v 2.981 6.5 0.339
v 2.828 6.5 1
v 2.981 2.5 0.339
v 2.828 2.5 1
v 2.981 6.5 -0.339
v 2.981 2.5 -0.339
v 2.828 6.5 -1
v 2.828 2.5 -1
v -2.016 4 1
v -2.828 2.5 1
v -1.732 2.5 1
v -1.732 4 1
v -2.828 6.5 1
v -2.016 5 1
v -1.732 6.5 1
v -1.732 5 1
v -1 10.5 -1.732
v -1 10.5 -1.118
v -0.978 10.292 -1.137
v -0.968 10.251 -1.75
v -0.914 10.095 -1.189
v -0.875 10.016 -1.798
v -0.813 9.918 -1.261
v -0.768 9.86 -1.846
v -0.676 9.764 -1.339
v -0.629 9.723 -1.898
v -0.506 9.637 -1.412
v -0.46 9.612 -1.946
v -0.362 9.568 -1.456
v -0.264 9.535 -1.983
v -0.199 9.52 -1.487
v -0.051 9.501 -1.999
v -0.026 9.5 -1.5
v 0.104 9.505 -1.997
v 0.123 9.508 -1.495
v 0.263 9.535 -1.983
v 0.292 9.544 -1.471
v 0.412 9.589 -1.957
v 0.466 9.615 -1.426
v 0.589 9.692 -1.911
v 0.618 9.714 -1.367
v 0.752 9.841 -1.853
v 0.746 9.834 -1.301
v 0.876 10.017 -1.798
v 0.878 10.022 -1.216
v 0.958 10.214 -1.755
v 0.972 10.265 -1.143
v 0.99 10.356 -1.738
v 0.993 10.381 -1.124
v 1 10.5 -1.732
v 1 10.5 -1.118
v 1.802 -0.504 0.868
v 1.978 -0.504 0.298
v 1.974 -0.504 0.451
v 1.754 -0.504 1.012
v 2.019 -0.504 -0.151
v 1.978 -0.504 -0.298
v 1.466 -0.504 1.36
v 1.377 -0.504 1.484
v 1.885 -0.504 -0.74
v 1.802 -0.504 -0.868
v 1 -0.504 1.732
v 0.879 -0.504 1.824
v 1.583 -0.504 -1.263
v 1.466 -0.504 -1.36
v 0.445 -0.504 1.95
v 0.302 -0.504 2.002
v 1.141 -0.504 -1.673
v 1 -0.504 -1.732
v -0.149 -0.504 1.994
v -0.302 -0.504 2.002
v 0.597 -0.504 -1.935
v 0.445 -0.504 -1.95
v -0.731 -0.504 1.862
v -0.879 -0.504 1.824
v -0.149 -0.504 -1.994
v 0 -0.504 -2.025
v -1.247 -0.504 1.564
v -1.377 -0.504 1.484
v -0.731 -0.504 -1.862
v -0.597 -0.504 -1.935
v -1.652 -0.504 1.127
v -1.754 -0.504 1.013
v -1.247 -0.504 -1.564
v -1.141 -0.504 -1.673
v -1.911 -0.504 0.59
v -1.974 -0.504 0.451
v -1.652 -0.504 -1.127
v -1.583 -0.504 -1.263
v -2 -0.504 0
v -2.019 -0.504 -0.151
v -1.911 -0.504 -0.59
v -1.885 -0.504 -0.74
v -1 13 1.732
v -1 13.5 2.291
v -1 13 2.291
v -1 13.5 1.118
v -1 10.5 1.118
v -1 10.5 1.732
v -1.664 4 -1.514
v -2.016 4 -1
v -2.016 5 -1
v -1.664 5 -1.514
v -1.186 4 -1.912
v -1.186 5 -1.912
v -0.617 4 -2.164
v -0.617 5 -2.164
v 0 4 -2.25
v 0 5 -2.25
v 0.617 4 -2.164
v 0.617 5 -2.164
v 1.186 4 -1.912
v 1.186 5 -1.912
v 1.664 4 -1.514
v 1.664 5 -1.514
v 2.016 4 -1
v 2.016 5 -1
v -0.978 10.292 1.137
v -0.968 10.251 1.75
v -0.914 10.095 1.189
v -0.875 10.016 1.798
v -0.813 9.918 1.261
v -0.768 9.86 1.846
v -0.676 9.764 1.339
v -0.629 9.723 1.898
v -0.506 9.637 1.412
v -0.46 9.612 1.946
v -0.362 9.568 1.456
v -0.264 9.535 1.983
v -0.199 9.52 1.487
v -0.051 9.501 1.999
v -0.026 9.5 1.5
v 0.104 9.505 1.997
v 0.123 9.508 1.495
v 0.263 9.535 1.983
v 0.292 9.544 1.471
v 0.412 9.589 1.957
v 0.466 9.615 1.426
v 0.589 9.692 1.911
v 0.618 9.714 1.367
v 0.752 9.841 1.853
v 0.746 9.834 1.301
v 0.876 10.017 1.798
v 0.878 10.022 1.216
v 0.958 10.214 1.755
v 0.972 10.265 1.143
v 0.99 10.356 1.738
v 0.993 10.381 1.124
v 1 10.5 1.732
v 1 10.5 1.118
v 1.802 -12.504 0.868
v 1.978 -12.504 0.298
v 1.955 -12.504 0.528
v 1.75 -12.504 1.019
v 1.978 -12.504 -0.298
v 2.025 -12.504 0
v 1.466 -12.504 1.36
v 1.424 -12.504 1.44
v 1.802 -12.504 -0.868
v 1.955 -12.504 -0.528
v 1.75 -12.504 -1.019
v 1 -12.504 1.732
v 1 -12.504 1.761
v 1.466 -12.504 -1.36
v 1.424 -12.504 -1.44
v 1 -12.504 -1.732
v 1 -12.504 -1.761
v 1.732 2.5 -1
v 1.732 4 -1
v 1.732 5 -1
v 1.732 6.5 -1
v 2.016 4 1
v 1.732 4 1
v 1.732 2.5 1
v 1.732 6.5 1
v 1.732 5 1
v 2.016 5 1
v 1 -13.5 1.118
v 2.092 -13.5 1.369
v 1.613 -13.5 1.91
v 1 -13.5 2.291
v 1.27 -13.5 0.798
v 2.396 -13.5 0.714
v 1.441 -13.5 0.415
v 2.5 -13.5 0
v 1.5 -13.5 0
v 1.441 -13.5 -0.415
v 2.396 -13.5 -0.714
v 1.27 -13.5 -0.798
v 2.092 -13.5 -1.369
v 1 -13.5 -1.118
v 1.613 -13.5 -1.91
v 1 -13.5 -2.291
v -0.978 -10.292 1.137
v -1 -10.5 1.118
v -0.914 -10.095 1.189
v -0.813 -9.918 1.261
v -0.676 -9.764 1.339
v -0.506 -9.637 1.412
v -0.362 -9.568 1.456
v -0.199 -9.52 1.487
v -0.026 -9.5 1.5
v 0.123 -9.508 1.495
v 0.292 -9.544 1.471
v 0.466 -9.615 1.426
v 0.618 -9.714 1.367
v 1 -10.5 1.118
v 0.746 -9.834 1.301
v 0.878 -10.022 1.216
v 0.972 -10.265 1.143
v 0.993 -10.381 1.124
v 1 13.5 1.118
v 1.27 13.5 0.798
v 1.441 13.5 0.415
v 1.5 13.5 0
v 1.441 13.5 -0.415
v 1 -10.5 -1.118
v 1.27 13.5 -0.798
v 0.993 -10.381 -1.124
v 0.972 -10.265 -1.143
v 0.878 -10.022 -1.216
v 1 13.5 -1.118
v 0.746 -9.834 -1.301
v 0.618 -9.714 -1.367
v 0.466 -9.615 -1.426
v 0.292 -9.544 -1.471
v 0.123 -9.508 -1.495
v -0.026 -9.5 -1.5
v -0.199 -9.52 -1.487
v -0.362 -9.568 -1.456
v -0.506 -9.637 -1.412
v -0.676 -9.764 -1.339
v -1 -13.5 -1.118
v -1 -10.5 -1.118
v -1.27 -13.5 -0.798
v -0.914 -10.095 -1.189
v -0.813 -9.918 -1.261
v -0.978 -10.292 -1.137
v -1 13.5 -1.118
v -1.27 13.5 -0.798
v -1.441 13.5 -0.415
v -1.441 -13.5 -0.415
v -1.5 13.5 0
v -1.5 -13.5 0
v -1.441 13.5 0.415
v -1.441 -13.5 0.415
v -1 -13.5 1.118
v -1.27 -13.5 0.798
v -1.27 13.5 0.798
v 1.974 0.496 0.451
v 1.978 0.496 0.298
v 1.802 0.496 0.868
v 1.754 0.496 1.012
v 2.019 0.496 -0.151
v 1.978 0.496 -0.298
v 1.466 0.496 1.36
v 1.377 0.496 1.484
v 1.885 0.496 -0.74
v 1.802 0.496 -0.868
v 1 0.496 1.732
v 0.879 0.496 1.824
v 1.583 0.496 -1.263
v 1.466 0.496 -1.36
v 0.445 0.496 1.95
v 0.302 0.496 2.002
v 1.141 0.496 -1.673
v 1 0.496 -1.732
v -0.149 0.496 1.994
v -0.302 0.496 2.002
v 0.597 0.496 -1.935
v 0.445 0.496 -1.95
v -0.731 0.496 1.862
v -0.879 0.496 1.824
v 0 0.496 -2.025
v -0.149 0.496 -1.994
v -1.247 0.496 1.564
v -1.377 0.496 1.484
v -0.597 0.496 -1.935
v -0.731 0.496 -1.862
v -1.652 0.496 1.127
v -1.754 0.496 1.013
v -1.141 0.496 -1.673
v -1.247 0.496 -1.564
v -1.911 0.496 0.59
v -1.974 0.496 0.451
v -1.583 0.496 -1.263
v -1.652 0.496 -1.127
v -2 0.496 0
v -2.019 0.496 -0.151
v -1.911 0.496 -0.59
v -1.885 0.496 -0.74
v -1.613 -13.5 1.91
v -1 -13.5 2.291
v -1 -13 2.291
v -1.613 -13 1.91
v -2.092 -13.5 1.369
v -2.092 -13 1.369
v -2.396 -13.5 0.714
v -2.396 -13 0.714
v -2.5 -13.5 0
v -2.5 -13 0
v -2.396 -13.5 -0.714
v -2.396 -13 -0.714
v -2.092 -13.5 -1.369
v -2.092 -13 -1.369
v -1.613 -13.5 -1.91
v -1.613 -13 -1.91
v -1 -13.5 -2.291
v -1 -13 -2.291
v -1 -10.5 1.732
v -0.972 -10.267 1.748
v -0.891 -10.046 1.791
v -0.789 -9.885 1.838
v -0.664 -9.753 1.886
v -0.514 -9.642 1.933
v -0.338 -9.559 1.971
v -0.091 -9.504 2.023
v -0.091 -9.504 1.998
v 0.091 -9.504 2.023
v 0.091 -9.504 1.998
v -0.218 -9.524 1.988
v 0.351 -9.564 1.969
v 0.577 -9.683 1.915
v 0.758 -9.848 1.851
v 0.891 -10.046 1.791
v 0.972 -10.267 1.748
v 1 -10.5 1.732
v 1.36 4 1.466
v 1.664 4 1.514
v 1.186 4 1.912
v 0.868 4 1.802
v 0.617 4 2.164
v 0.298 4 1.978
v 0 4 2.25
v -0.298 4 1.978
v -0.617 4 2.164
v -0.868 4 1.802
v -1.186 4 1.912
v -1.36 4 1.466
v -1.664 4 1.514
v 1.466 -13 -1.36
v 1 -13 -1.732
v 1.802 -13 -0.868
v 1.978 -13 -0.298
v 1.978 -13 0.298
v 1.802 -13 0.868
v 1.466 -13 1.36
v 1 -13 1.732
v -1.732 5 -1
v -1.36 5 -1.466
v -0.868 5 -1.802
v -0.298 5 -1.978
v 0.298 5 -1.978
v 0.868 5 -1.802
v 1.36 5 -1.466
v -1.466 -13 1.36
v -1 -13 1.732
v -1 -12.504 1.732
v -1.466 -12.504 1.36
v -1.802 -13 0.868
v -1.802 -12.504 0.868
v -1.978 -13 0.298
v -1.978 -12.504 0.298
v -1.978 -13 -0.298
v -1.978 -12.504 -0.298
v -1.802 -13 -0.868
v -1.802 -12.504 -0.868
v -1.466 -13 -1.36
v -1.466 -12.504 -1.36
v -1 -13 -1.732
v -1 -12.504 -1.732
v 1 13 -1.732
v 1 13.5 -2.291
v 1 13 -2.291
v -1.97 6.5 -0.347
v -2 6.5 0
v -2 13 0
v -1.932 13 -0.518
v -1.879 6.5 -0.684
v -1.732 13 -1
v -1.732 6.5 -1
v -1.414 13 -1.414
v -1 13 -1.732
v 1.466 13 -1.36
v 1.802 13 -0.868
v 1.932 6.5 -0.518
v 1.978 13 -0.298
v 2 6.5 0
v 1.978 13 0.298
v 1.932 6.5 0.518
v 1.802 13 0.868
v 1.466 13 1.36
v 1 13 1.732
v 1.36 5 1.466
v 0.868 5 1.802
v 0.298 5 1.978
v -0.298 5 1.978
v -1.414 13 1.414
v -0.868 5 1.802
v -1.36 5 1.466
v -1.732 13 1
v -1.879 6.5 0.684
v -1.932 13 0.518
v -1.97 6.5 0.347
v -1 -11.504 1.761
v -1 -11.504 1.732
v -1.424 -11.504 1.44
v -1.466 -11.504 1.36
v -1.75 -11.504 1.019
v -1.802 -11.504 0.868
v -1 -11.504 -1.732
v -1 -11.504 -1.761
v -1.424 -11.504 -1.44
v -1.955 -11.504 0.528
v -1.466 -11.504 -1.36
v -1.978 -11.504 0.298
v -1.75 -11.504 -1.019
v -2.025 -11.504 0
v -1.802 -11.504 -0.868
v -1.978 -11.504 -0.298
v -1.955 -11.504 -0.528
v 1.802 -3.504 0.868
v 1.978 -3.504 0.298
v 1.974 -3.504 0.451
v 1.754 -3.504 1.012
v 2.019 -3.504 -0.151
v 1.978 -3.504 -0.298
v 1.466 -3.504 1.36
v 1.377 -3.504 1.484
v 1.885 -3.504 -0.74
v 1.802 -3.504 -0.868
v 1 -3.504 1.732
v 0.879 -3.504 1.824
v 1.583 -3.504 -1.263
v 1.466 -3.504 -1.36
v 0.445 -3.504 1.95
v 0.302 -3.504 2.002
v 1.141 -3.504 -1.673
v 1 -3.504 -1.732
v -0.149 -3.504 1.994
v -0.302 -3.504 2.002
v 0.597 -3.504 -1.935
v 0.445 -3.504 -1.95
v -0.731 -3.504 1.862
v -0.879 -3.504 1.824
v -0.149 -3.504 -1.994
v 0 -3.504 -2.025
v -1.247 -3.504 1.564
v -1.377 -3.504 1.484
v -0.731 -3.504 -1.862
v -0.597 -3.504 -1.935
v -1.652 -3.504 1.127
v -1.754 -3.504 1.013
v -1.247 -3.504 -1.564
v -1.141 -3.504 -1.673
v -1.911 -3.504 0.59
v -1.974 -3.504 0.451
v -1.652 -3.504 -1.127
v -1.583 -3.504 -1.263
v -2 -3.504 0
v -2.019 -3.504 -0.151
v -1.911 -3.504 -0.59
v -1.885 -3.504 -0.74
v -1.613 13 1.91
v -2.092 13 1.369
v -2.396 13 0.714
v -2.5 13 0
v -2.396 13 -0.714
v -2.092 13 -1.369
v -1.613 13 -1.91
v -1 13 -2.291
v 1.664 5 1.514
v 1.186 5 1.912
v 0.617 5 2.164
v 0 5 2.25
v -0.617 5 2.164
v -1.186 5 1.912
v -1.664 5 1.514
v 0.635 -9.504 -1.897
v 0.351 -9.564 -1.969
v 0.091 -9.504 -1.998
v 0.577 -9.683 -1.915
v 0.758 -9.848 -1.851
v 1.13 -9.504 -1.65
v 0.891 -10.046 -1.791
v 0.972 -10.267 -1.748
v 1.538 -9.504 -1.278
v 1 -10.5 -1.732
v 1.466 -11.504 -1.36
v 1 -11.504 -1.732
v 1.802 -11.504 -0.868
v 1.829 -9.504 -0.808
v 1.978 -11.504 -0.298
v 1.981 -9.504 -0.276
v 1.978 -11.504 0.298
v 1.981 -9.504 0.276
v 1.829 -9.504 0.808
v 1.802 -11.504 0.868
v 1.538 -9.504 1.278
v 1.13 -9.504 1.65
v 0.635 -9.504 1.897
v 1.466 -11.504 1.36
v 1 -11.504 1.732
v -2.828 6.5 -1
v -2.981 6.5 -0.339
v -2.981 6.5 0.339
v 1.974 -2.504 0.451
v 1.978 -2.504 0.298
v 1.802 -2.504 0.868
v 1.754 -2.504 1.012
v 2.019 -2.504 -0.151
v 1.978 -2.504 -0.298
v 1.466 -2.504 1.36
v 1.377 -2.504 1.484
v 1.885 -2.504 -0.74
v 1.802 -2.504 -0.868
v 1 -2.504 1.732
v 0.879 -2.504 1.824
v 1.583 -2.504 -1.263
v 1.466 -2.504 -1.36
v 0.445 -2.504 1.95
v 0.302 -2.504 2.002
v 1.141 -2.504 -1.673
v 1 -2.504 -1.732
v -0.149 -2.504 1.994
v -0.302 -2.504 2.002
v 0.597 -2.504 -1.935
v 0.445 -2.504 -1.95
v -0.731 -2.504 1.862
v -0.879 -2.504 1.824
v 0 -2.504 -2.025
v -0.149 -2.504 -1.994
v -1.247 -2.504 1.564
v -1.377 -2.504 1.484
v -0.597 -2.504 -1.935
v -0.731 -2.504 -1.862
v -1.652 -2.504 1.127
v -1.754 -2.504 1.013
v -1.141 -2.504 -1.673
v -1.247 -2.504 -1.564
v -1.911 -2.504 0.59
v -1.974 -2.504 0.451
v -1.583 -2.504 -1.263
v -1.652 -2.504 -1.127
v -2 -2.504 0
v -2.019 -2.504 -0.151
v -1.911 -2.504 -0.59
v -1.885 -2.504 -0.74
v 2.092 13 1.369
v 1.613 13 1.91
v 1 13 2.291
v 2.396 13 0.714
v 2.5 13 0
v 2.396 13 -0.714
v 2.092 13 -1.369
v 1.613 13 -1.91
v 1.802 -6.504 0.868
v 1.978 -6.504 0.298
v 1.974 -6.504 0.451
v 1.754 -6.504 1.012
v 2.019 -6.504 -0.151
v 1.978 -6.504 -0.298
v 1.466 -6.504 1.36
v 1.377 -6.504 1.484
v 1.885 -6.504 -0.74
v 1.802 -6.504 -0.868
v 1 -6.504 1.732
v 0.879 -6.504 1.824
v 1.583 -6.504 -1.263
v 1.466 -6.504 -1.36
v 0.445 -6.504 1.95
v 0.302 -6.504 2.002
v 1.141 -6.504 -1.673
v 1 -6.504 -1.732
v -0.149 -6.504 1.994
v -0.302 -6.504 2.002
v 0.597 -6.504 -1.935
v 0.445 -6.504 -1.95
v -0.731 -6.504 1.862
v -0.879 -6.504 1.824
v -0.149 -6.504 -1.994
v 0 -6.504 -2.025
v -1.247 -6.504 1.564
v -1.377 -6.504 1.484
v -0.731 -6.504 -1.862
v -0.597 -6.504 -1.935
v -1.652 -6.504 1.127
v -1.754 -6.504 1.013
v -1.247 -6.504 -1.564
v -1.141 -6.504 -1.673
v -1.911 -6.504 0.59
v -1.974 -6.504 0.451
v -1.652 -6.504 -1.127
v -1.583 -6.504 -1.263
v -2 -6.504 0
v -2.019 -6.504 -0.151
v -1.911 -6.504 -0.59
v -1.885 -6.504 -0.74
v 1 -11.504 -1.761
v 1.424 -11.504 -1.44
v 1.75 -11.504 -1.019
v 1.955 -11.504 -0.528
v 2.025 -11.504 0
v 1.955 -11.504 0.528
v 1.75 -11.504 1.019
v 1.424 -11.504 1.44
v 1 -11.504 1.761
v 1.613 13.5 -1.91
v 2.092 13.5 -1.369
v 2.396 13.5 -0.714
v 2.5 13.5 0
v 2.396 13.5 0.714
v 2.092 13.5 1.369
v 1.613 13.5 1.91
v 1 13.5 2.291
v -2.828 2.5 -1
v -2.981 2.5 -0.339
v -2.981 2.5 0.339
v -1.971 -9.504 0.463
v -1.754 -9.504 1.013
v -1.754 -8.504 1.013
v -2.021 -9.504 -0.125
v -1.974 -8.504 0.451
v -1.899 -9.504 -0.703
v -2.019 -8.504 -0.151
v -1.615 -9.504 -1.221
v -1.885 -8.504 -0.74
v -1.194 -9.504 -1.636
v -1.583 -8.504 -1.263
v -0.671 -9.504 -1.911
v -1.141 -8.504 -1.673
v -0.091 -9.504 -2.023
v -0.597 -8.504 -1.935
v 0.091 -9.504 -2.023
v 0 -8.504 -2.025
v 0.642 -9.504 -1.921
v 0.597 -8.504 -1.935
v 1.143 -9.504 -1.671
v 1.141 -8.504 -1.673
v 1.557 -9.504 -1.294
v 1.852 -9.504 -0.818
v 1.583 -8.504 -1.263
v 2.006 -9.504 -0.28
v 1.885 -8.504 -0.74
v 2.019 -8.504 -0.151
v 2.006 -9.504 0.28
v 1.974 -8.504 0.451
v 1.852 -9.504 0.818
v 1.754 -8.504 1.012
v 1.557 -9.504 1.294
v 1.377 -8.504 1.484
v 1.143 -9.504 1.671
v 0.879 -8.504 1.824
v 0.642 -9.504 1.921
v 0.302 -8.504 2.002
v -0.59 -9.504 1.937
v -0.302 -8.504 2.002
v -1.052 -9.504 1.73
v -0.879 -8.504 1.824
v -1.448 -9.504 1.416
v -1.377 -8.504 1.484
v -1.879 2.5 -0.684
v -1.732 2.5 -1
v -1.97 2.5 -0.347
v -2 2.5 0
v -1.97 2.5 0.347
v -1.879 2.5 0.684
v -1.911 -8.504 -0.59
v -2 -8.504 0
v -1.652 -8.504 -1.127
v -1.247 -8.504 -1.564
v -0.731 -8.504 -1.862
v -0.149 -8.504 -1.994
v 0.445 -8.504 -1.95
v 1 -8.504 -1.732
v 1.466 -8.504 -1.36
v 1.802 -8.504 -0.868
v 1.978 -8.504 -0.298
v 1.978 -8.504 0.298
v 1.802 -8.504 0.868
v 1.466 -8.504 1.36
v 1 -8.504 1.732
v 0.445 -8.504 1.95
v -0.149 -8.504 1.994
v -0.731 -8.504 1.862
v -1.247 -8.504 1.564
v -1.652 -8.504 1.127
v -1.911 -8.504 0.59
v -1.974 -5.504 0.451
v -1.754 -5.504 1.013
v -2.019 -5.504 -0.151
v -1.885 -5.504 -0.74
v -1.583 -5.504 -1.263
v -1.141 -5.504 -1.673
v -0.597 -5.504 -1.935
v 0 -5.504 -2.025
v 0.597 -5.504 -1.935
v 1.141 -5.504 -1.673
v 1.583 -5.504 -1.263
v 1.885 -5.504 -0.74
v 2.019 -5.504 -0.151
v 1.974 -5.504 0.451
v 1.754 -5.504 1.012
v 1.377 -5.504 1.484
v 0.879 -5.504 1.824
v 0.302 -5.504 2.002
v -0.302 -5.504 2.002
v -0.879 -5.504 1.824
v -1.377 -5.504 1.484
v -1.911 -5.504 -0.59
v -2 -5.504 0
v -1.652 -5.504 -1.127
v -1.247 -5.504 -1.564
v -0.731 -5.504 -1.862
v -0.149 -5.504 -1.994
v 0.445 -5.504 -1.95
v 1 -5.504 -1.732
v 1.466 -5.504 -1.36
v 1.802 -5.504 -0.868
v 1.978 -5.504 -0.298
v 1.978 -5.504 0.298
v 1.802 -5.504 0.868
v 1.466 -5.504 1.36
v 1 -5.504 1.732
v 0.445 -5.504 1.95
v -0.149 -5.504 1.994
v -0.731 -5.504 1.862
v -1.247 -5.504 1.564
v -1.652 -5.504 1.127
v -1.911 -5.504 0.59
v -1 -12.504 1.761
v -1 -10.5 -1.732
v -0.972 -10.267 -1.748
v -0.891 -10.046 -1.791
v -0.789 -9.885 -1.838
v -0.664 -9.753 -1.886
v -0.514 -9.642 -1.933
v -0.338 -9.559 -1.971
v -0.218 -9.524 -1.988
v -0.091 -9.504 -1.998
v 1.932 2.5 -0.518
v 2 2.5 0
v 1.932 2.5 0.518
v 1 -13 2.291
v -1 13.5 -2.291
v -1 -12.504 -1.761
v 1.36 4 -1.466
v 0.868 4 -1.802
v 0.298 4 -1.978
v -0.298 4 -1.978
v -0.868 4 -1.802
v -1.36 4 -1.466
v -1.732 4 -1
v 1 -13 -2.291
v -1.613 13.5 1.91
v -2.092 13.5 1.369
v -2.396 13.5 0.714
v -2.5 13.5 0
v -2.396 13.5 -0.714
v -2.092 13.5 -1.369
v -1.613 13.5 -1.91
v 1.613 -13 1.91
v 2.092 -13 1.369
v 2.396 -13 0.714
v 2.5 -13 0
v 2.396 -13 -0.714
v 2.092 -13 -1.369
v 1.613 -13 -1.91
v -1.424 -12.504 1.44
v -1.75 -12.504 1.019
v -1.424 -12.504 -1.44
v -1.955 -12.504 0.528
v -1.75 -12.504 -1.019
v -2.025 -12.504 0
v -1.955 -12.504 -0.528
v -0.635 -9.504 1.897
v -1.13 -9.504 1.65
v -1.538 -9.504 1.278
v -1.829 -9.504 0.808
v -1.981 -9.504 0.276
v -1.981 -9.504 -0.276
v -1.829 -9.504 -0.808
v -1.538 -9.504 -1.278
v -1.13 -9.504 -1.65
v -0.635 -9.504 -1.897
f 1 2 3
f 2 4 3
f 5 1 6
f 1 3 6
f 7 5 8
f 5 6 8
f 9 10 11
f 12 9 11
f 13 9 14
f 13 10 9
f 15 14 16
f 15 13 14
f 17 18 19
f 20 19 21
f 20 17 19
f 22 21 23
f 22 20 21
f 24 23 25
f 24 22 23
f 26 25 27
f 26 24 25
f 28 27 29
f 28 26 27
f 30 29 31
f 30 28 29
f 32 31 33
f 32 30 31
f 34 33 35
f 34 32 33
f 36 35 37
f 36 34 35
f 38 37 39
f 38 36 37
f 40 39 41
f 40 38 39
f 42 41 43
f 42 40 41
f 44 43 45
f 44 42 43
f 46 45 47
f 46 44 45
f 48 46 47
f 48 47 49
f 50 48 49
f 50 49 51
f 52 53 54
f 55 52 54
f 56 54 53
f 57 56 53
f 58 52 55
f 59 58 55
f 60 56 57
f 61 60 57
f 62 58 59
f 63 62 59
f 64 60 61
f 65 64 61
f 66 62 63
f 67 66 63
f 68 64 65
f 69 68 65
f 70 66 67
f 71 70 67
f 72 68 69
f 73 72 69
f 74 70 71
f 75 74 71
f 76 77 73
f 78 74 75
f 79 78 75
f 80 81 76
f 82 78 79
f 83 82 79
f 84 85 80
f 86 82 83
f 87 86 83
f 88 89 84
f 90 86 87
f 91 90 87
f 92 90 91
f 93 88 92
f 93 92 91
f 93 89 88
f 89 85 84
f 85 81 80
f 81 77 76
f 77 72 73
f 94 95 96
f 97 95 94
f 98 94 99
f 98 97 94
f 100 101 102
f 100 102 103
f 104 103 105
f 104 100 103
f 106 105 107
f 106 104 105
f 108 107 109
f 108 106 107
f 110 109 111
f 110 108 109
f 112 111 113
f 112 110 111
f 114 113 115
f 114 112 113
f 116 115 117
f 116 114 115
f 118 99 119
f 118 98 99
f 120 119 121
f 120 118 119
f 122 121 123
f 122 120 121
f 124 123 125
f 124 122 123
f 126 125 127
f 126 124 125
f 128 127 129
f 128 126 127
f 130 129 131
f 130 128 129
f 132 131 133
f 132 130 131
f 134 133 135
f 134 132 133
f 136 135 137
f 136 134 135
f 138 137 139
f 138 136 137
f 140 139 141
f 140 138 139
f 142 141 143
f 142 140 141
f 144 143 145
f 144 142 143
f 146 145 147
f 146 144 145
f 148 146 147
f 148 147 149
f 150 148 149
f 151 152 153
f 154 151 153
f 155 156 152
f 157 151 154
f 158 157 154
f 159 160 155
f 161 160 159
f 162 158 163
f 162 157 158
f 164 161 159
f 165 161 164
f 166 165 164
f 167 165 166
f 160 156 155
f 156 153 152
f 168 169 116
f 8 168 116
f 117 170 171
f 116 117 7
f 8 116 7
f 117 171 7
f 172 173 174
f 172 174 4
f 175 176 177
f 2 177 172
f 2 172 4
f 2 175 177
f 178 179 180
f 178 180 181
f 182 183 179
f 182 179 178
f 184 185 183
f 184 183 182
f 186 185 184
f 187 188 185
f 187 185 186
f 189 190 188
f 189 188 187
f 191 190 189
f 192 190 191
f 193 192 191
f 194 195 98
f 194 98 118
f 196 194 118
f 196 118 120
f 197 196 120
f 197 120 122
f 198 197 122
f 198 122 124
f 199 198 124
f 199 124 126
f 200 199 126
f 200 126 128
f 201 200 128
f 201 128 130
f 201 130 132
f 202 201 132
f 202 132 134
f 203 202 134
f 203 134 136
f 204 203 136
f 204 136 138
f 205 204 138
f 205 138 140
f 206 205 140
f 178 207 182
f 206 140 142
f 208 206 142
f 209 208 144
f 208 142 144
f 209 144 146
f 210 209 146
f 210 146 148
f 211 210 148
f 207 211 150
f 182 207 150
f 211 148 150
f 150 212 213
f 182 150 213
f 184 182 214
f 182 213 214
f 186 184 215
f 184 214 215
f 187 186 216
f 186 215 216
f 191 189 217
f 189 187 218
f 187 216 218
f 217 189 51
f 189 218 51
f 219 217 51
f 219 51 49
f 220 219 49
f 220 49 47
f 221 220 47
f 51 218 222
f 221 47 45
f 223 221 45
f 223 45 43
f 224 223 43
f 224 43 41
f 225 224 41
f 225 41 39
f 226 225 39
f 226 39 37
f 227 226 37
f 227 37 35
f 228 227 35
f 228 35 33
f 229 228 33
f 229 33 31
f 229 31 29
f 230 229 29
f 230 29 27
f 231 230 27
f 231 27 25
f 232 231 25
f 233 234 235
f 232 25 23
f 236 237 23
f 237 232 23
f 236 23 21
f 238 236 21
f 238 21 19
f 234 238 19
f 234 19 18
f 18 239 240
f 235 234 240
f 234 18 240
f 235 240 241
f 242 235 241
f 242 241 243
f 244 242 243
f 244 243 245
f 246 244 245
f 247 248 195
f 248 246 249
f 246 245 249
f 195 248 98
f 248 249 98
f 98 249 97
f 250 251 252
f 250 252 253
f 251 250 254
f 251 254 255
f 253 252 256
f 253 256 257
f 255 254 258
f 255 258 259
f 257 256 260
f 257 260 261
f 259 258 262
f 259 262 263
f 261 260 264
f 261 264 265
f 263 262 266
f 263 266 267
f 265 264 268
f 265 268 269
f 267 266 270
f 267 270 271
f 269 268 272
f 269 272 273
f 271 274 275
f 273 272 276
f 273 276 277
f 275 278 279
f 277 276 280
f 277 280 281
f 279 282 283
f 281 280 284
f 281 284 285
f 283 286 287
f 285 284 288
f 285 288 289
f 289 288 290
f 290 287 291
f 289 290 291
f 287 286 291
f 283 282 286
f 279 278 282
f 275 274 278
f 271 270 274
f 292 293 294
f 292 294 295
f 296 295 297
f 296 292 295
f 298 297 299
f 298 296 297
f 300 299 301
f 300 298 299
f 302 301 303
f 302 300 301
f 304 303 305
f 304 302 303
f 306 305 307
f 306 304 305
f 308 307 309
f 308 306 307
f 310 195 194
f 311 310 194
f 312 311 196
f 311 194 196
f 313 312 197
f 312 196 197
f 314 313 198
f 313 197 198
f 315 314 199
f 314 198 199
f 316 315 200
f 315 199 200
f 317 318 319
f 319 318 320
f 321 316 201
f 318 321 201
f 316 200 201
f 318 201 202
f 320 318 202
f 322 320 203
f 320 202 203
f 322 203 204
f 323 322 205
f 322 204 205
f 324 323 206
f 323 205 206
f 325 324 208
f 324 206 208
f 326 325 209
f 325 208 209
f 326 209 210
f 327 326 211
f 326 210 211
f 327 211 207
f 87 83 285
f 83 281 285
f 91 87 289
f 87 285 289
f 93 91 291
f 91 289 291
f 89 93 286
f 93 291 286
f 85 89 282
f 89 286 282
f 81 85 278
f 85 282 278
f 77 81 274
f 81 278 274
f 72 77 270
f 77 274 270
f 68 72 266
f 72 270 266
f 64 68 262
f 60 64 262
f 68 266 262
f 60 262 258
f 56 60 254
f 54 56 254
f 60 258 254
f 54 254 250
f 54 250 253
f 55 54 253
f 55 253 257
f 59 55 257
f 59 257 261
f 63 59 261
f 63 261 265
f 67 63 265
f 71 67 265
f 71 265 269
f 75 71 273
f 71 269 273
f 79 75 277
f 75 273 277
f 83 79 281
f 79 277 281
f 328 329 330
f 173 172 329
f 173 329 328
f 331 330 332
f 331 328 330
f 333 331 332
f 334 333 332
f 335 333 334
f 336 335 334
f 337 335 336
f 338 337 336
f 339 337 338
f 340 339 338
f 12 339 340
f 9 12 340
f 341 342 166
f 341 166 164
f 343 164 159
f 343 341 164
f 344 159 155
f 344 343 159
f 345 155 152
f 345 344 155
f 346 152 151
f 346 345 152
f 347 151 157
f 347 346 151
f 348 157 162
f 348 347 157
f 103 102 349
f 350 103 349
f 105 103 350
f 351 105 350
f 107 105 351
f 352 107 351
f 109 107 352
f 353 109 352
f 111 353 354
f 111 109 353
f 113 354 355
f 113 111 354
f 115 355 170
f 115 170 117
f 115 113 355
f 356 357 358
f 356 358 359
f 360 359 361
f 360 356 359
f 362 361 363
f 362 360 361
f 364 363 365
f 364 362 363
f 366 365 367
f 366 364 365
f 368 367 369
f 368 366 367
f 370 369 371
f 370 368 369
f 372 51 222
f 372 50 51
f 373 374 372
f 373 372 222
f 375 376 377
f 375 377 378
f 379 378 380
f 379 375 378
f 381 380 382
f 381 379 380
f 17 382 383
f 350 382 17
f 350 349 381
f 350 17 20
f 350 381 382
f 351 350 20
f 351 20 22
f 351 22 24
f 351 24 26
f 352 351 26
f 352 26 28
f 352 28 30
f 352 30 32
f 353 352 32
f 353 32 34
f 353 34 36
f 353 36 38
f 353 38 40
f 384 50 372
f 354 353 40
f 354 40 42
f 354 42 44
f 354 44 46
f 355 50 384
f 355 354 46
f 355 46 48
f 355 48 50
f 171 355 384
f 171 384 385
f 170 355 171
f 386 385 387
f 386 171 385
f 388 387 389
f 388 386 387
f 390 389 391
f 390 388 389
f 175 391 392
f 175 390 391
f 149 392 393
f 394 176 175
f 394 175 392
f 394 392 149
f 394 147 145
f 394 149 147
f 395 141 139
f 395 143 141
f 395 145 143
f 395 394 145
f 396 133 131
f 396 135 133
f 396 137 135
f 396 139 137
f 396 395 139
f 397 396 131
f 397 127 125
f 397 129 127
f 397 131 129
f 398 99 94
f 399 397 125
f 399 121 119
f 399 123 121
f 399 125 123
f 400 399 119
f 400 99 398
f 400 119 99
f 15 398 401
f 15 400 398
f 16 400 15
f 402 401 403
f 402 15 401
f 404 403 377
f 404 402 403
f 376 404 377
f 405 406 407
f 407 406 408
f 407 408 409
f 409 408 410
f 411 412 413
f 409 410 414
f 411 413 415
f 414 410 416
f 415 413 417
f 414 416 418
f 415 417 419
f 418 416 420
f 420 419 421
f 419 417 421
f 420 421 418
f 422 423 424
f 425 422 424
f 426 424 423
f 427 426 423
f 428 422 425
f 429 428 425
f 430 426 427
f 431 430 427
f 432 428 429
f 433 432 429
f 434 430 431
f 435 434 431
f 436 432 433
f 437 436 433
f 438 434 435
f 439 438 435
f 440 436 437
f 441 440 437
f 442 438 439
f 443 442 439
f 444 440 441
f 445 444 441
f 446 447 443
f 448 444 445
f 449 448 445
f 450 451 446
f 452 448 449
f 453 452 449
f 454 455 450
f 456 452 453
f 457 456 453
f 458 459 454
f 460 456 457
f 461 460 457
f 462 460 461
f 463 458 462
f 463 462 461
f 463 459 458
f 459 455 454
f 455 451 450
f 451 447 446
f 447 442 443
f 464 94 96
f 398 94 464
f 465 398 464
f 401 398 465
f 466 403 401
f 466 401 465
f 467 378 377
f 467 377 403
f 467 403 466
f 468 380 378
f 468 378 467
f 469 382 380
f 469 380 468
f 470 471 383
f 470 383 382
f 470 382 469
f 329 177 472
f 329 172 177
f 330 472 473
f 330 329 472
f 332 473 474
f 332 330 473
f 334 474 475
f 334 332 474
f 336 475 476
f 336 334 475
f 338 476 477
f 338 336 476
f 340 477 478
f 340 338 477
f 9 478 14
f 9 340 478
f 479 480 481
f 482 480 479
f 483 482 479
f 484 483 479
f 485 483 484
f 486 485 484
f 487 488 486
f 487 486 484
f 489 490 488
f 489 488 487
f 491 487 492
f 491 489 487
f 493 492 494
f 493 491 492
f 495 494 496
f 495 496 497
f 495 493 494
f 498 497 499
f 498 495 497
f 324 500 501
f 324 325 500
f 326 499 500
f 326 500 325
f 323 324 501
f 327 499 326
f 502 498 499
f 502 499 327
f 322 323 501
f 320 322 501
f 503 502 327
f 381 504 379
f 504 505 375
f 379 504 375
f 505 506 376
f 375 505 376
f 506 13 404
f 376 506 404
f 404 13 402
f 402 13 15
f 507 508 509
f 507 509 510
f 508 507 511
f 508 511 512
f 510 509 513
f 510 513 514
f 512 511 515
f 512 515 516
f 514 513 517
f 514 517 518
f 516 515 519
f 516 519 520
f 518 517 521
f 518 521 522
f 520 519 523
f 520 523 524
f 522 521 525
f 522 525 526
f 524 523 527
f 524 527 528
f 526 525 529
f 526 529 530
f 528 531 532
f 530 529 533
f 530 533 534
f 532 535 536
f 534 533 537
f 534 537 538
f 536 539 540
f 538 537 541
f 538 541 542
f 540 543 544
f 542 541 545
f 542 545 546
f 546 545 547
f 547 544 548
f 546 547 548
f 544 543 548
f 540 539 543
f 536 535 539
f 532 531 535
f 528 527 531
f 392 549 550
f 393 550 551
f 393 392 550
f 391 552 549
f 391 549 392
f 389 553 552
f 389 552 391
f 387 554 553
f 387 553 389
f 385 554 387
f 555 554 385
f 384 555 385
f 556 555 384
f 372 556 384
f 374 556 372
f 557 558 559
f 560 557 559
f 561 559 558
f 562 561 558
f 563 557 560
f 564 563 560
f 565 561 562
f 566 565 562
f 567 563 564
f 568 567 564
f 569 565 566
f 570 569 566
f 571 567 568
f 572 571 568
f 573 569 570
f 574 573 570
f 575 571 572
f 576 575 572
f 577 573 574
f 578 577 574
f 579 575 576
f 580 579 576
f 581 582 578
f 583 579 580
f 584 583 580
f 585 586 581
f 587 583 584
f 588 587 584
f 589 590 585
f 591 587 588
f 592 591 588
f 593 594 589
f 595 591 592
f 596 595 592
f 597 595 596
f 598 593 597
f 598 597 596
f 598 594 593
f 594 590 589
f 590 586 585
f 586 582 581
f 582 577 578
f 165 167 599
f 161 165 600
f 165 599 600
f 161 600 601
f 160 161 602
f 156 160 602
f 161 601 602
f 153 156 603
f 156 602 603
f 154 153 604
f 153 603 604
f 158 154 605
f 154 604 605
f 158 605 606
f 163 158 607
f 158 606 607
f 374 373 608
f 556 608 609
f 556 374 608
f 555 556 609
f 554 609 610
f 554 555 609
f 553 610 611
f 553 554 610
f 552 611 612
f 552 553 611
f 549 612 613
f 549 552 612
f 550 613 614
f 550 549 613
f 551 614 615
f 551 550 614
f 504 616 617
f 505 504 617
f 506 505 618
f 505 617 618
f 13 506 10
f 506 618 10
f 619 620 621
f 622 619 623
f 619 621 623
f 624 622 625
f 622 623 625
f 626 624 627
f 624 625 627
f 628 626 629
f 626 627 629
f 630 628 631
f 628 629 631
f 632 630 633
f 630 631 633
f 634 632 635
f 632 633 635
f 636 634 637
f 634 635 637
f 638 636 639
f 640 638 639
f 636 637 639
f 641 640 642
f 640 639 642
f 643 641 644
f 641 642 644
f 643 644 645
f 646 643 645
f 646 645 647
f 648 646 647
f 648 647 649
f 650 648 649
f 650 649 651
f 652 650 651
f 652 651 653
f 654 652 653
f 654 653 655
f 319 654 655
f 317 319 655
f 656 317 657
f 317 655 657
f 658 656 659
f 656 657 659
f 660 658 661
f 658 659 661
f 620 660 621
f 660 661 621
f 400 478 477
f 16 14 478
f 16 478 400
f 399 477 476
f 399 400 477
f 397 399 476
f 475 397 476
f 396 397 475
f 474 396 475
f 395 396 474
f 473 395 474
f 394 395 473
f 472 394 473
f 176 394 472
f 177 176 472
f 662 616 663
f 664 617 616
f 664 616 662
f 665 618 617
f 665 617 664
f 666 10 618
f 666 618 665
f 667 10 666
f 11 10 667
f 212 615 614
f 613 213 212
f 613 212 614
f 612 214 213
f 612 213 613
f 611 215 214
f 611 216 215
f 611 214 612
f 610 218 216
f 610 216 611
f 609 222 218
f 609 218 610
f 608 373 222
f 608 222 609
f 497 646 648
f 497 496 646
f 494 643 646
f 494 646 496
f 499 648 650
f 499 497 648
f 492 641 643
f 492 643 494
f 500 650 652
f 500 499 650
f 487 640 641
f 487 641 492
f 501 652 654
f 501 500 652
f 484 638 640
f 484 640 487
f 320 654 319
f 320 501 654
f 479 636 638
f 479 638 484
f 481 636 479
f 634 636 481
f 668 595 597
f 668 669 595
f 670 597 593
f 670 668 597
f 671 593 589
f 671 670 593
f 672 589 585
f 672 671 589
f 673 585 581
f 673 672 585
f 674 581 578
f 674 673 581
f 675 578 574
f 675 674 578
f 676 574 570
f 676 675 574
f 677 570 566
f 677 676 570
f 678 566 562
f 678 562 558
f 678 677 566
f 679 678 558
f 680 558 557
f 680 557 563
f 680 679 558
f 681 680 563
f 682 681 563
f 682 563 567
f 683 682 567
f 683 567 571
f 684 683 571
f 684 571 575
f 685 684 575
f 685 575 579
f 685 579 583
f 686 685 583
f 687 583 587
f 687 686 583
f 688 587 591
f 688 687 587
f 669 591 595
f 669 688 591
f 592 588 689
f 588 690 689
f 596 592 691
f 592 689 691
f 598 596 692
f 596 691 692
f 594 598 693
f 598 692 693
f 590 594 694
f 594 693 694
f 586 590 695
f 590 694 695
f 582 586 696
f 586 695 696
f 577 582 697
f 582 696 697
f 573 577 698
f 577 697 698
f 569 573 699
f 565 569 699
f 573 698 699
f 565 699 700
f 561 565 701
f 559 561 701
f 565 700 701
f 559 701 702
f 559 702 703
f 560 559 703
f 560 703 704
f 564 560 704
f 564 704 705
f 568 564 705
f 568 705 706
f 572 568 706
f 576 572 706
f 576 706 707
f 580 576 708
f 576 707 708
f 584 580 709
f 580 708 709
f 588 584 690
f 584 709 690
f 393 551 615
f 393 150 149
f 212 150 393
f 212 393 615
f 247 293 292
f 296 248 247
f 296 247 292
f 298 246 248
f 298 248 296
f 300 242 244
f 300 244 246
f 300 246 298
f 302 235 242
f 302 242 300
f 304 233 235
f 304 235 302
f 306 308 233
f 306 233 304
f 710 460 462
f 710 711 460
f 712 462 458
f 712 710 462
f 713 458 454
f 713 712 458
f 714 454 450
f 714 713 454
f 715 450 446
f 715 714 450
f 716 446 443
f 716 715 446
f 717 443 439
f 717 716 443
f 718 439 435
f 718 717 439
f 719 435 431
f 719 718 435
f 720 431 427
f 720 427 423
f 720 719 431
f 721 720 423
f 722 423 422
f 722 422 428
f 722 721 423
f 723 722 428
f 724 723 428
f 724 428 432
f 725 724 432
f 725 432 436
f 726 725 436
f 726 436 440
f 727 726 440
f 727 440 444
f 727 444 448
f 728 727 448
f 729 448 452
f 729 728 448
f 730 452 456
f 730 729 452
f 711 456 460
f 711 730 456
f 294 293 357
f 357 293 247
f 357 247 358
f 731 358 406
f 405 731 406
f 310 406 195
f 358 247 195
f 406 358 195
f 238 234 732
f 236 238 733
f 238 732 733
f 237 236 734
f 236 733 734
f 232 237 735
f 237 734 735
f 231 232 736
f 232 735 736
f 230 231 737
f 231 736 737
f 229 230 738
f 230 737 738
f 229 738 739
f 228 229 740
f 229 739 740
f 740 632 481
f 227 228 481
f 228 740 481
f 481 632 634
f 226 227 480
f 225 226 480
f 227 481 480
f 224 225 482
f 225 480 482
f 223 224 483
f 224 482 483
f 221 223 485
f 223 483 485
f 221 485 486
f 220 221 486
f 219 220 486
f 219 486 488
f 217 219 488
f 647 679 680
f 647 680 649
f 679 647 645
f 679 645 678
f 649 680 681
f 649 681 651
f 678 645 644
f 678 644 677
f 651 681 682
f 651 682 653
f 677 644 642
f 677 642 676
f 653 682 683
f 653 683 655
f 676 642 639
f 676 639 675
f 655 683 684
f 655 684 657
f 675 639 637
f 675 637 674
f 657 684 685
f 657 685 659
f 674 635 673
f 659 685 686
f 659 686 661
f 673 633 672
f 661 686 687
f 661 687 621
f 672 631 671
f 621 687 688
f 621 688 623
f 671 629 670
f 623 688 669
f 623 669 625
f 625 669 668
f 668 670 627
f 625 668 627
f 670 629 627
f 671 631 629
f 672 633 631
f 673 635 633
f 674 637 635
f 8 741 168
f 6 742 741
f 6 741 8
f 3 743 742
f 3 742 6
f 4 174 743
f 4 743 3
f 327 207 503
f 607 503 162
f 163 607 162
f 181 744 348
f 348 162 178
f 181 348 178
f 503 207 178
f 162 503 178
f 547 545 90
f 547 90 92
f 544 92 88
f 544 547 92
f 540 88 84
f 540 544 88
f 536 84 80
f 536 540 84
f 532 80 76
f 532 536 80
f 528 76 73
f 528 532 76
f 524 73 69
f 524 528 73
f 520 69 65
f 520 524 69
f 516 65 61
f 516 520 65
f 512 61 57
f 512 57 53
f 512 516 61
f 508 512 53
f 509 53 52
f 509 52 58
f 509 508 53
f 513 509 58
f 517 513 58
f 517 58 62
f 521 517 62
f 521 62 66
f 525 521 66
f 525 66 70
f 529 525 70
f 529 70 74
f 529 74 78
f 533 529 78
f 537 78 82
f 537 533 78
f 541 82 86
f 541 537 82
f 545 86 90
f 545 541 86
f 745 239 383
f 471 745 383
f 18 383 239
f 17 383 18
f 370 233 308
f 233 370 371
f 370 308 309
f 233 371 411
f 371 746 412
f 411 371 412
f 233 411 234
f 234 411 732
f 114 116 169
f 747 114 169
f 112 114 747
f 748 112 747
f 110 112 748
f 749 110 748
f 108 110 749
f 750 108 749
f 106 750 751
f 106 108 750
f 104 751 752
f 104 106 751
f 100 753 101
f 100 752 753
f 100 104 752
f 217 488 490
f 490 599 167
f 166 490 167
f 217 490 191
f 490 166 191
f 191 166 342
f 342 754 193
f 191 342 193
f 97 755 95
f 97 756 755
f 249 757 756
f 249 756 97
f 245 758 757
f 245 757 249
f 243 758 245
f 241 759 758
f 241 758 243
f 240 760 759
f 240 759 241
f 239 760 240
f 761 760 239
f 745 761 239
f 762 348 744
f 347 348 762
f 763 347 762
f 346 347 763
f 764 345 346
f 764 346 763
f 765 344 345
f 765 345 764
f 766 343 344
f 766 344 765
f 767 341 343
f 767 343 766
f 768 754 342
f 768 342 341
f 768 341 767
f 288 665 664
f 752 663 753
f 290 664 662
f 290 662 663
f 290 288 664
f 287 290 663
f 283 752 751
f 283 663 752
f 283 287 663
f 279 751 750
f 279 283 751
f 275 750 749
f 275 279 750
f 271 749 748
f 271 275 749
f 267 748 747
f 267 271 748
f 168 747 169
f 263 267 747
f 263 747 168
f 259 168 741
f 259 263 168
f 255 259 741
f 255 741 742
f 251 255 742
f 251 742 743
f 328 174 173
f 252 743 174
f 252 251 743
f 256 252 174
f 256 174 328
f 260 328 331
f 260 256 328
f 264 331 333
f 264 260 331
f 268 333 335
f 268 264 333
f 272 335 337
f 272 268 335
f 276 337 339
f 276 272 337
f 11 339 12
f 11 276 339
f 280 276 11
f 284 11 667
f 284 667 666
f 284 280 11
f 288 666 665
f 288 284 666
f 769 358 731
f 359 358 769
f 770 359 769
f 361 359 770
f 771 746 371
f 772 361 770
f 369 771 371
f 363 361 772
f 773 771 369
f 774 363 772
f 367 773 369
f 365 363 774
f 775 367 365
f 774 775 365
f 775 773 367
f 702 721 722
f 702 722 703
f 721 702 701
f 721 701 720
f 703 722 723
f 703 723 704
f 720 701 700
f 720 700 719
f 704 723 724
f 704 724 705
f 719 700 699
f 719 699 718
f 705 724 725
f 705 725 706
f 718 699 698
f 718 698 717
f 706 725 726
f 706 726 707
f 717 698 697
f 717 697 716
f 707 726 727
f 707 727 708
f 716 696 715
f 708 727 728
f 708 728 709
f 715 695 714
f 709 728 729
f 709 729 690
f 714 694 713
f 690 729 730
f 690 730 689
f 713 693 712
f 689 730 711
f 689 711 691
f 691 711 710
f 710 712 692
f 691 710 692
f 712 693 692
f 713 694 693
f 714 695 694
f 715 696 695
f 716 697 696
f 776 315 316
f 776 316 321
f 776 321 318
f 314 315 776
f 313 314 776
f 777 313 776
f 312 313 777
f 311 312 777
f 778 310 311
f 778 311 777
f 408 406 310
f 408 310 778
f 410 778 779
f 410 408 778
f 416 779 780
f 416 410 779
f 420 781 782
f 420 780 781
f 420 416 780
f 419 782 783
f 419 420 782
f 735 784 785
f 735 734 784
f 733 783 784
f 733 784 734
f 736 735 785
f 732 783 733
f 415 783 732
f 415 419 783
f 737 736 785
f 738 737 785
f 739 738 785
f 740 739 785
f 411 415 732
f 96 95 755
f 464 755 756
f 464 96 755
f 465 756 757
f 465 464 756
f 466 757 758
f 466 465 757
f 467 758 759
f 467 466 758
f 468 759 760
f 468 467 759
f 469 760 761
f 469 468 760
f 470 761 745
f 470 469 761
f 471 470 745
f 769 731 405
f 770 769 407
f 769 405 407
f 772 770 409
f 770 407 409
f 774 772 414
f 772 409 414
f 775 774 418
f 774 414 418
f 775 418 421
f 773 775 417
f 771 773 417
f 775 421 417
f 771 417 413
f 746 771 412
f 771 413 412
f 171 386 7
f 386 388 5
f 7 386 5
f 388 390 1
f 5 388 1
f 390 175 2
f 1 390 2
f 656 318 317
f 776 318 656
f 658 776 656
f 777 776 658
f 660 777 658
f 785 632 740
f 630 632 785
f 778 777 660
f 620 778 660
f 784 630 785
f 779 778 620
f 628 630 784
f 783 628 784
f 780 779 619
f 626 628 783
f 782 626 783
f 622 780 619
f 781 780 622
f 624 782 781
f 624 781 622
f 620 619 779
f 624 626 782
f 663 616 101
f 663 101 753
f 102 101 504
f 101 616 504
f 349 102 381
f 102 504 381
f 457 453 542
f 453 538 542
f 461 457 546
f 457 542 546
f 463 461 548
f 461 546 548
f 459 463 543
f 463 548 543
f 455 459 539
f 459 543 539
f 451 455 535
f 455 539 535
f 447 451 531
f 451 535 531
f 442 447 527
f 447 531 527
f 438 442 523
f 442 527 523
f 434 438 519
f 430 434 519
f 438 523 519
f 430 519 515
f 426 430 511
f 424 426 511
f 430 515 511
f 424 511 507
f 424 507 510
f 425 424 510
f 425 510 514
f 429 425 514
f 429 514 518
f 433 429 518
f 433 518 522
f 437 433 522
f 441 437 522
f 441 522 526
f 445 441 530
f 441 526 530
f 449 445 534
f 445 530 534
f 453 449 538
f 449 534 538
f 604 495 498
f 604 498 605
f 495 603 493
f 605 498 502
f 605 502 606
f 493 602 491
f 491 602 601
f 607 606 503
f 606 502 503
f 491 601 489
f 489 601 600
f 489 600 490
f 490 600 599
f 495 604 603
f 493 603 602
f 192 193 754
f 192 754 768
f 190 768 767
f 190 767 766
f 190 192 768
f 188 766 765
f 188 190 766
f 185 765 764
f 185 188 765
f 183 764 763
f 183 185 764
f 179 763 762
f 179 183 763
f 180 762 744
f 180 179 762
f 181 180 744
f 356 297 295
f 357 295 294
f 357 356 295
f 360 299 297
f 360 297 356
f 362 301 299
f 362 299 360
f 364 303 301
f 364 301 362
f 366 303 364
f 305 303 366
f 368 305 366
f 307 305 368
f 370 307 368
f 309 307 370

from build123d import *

# Parameters (mm, degrees)
SKETCH3_W               = 6
SKETCH3_H               = 4
BOSS_EXTRUDE4_DEPTH     = 1
SKETCH7_W               = 2.025
SKETCH7_H               = 1
LPATTERN1_COUNT         = 5
LPATTERN1_PITCH         = 3
CUT_EXTRUDE2_DEPTH      = 15.053469323
CUT_EXTRUDE2_DEPTH_BACK = 15.053469323
CUT_EXTRUDE3_REACH      = 29.263
SKETCH6_R               = 1.5
SKETCH8_OUTSIDE_W       = 13.608
SKETCH8_OUTSIDE_H       = 12.19
SKETCH8_OUTSIDE_R       = 3
CUT_EXTRUDE4_DEPTH      = 15.017845865
CUT_EXTRUDE4_DEPTH_BACK = 15.017845865


with BuildPart() as part:
    # Sketch1 → Revolve5 (revolve)
    with BuildSketch(Plane.XY):
        Polygon((0, 13.5), (-2.5, 13.5), (-2.5, 13), (-2, 13), (-2, 5), (-2.25, 5), (-2.25, 4), (-2, 4), (-2, -13), (-2.5, -13), (-2.5, -13.5), (0, -13.5), align=None)
    revolve(axis=Axis((0, 13.5, 0), (0, -1, 0)))

    # Sketch3 → Boss-Extrude4 (add, symmetric)
    with BuildSketch(Plane.XY):
        with Locations((0, 4.5)):
            Rectangle(SKETCH3_W, SKETCH3_H)
    extrude(amount=BOSS_EXTRUDE4_DEPTH, both=True)

    # Sketch7 → Revolve7 (revolve)
    with BuildSketch(Plane.XY, mode=Mode.PRIVATE) as revolve7_sk:
        with Locations((-1.0125, -0.004180602)):
            Rectangle(SKETCH7_W, SKETCH7_H)
    revolve7 = revolve(revolve7_sk.sketch.rotate(Axis((0, 5, 0), (0, -1, 0)), 330), axis=Axis((0, 5, 0), (0, -1, 0)))

    # LPattern1: Revolve7 ×5
    with Locations(*[(0, -i * LPATTERN1_PITCH, 0) for i in range(1, LPATTERN1_COUNT)]):
        add(revolve7)

    # Sketch5 → Cut-Extrude2 (cut, two sides)
    with BuildSketch(Plane.XY) as cut_extrude2_sk:
        with BuildLine():
            Line((-1, 13.5), (-1, 10.5))
            ThreePointArc((-1, 10.5), (0, 9.5), (1, 10.5))
            Line((1, 10.5), (1, 13.5))
            Line((1, 13.5), (-1, 13.5))
        make_face()
        with BuildLine():
            Line((-1, -13.5), (-1, -10.5))
            ThreePointArc((-1, -10.5), (0, -9.5), (1, -10.5))
            Line((1, -10.5), (1, -13.5))
            Line((1, -13.5), (-1, -13.5))
        make_face()
    extrude(amount=CUT_EXTRUDE2_DEPTH, mode=Mode.SUBTRACT)
    extrude(cut_extrude2_sk.sketch, amount=-CUT_EXTRUDE2_DEPTH_BACK, mode=Mode.SUBTRACT)

    # Cut-Extrude3: up to this face of the body (flat: up to its plane)
    cut_extrude3_end = Plane(part.part.faces().sort_by_distance((-1.618726141, -13.5, 0))[0])
    # Sketch6 → Cut-Extrude3 (cut, up to the picked face)
    with BuildSketch(Plane(origin=(0, 13.5, 0), x_dir=(1, 0, 0), z_dir=(0, 1, 0)), mode=Mode.PRIVATE) as cut_extrude3_sk1:
        with Locations(Location((0, 0, 0), (0, 0, 228.189685104))):
            Circle(SKETCH6_R)
    cut_extrude3_tool1 = split(extrude(cut_extrude3_sk1.sketch, amount=-CUT_EXTRUDE3_REACH, mode=Mode.PRIVATE), bisect_by=cut_extrude3_end, keep=Keep.BOTH, mode=Mode.PRIVATE)
    add(cut_extrude3_tool1.solids().sort_by(Axis((0, 13.5, 0), (0, -1, 0)))[0], mode=Mode.SUBTRACT)

    # Sketch8 outside → Cut-Extrude4 (cut, two sides)
    with BuildSketch(Plane(origin=(0, 0, 0), x_dir=(1, 0, 0), z_dir=(0, 1, 0))) as cut_extrude4_sk:
        Rectangle(SKETCH8_OUTSIDE_W, SKETCH8_OUTSIDE_H)
        Circle(SKETCH8_OUTSIDE_R, mode=Mode.SUBTRACT)
    extrude(amount=CUT_EXTRUDE4_DEPTH, mode=Mode.SUBTRACT)
    extrude(cut_extrude4_sk.sketch, amount=-CUT_EXTRUDE4_DEPTH_BACK, mode=Mode.SUBTRACT)


solid = part.part
